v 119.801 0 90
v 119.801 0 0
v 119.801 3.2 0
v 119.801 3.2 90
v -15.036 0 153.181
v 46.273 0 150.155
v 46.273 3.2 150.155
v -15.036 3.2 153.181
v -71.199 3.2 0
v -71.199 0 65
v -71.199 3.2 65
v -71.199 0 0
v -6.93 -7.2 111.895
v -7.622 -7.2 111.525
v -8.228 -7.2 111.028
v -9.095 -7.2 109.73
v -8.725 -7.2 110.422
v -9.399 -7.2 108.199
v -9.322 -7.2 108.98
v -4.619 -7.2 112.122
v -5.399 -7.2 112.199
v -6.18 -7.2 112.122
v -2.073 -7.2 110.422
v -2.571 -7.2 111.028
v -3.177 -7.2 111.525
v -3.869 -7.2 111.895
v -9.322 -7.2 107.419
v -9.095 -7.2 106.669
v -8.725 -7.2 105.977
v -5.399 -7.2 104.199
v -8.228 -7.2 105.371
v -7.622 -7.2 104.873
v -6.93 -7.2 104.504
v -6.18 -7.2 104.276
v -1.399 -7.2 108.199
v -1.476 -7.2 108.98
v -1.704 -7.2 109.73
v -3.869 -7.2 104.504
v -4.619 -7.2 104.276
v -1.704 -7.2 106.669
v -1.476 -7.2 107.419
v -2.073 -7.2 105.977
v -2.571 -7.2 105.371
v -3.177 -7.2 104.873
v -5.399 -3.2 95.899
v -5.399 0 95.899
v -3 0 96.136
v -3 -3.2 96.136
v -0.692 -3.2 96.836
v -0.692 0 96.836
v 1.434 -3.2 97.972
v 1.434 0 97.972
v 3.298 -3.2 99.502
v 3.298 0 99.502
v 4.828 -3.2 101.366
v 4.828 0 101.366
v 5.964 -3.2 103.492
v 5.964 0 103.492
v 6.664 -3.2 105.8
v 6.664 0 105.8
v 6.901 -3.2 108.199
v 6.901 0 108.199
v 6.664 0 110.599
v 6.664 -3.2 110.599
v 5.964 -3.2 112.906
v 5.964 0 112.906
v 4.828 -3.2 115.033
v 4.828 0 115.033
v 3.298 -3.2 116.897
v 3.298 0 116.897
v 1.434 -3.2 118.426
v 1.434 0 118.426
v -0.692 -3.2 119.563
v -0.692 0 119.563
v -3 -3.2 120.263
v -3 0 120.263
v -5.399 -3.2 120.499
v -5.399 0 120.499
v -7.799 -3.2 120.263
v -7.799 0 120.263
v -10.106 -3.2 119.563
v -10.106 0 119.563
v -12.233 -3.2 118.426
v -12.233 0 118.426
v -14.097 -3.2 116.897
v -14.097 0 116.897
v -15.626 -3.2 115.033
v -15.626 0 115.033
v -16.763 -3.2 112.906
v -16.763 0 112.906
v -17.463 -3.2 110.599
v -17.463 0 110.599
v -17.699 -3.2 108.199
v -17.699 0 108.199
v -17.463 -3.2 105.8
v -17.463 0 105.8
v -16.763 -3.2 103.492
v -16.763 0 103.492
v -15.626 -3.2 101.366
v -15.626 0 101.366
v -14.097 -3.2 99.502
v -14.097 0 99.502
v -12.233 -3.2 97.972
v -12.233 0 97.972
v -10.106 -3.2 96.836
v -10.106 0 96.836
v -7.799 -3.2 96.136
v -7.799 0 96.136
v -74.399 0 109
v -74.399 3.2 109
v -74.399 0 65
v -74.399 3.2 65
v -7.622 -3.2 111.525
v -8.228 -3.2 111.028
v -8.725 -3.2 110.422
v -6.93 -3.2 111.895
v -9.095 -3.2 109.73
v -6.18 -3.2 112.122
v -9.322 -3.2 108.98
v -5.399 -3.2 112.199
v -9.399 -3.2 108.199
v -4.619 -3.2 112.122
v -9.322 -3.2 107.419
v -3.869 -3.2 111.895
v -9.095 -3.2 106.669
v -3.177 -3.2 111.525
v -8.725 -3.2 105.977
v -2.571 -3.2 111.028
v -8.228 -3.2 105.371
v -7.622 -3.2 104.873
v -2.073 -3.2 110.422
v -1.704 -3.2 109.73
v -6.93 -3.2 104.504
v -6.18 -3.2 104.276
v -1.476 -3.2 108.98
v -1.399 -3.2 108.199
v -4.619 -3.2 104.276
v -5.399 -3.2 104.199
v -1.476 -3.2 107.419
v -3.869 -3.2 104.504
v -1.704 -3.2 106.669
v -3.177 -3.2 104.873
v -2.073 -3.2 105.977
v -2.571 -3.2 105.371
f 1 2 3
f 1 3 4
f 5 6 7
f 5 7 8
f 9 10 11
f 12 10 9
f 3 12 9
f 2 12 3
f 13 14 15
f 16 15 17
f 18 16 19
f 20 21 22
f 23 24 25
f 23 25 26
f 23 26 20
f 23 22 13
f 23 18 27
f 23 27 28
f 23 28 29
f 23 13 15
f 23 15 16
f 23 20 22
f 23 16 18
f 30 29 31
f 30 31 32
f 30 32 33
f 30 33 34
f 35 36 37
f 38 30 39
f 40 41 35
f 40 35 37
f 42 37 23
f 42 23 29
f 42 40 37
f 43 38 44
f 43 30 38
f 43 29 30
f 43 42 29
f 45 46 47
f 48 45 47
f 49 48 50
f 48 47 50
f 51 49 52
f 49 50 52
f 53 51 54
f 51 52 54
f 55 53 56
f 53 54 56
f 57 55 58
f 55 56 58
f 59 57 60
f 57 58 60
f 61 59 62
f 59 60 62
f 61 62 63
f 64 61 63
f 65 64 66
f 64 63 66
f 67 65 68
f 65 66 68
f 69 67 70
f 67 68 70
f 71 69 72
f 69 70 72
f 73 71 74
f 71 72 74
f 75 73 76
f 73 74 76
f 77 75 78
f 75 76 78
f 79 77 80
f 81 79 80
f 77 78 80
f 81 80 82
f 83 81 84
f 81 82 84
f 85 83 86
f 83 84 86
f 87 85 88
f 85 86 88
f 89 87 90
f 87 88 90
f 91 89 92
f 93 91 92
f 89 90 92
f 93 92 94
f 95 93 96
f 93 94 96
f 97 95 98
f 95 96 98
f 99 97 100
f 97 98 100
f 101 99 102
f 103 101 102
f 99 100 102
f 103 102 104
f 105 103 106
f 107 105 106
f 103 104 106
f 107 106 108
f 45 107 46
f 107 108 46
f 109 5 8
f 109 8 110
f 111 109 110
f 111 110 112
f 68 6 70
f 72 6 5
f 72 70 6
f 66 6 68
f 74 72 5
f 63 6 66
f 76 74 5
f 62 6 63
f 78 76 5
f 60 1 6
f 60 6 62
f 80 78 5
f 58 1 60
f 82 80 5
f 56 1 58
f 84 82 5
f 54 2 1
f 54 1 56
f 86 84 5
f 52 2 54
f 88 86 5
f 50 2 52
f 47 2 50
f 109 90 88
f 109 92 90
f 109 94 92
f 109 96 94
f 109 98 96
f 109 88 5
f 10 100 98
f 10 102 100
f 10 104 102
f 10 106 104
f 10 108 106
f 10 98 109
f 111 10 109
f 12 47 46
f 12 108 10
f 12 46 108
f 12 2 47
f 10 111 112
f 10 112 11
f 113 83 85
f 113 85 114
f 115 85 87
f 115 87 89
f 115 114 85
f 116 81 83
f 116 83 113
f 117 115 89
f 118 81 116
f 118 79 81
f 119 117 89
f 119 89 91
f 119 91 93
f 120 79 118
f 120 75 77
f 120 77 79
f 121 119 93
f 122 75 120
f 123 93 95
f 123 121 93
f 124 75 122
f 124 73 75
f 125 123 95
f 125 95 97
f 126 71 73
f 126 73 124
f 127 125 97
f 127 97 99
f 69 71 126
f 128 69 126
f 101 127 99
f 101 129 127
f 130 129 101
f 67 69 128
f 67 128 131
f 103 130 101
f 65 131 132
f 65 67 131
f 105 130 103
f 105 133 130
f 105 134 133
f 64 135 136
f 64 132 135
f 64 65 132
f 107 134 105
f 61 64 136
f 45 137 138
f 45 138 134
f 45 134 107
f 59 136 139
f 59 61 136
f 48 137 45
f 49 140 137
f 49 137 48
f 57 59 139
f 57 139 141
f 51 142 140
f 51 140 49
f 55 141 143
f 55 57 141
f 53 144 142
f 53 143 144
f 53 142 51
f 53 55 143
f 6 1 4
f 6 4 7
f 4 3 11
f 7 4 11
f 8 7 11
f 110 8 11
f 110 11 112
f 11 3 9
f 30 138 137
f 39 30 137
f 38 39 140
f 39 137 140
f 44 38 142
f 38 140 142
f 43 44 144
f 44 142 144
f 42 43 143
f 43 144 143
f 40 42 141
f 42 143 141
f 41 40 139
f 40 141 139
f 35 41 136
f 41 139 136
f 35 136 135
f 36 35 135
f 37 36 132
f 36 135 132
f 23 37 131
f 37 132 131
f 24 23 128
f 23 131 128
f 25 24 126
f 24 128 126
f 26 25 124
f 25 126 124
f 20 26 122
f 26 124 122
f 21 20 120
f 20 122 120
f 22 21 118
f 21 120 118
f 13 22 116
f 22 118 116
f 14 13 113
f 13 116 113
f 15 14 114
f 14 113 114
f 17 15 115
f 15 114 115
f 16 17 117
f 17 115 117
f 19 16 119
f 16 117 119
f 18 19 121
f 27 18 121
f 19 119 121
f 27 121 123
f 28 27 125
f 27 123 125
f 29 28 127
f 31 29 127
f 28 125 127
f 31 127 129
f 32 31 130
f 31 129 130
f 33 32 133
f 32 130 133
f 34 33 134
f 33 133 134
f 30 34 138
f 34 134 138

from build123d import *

# Parameters (mm, degrees)
BOSS_EXTRUDE1_DEPTH = 3.2
SKETCH3_R           = 12.3
BOSS_EXTRUDE2_DEPTH = 3.2
SKETCH4_R           = 4
BOSS_EXTRUDE3_DEPTH = 4


with BuildPart() as part:
    # Sketch1 → Boss-Extrude1 (new body)
    with BuildSketch(Plane(origin=(0, 0, 0), x_dir=(1, 0, 0), z_dir=(0, 1, 0))):
        Polygon((-71.199297972, 0), (119.800702028, 0), (119.800702028, -90), (46.272924854, -150.155348756), (-15.035731115, -153.181069815), (-74.399297972, -109), (-74.399297972, -65), (-71.199297972, -65), align=None)
    extrude(amount=BOSS_EXTRUDE1_DEPTH)

    # Sketch3 → Boss-Extrude2 (add)
    with BuildSketch(Plane.XZ):
        with Locations(Location((-5.399297972, 108.199281837, 0), (0, 0, 270))):
            Circle(SKETCH3_R)
    extrude(amount=BOSS_EXTRUDE2_DEPTH)

    # Sketch4 → Boss-Extrude3 (add)
    with BuildSketch(Plane.XZ.offset(3.2)):
        with Locations(Location((-5.399297972, 108.199281837, 0), (0, 0, 270))):
            Circle(SKETCH4_R)
    extrude(amount=BOSS_EXTRUDE3_DEPTH)


solid = part.part
